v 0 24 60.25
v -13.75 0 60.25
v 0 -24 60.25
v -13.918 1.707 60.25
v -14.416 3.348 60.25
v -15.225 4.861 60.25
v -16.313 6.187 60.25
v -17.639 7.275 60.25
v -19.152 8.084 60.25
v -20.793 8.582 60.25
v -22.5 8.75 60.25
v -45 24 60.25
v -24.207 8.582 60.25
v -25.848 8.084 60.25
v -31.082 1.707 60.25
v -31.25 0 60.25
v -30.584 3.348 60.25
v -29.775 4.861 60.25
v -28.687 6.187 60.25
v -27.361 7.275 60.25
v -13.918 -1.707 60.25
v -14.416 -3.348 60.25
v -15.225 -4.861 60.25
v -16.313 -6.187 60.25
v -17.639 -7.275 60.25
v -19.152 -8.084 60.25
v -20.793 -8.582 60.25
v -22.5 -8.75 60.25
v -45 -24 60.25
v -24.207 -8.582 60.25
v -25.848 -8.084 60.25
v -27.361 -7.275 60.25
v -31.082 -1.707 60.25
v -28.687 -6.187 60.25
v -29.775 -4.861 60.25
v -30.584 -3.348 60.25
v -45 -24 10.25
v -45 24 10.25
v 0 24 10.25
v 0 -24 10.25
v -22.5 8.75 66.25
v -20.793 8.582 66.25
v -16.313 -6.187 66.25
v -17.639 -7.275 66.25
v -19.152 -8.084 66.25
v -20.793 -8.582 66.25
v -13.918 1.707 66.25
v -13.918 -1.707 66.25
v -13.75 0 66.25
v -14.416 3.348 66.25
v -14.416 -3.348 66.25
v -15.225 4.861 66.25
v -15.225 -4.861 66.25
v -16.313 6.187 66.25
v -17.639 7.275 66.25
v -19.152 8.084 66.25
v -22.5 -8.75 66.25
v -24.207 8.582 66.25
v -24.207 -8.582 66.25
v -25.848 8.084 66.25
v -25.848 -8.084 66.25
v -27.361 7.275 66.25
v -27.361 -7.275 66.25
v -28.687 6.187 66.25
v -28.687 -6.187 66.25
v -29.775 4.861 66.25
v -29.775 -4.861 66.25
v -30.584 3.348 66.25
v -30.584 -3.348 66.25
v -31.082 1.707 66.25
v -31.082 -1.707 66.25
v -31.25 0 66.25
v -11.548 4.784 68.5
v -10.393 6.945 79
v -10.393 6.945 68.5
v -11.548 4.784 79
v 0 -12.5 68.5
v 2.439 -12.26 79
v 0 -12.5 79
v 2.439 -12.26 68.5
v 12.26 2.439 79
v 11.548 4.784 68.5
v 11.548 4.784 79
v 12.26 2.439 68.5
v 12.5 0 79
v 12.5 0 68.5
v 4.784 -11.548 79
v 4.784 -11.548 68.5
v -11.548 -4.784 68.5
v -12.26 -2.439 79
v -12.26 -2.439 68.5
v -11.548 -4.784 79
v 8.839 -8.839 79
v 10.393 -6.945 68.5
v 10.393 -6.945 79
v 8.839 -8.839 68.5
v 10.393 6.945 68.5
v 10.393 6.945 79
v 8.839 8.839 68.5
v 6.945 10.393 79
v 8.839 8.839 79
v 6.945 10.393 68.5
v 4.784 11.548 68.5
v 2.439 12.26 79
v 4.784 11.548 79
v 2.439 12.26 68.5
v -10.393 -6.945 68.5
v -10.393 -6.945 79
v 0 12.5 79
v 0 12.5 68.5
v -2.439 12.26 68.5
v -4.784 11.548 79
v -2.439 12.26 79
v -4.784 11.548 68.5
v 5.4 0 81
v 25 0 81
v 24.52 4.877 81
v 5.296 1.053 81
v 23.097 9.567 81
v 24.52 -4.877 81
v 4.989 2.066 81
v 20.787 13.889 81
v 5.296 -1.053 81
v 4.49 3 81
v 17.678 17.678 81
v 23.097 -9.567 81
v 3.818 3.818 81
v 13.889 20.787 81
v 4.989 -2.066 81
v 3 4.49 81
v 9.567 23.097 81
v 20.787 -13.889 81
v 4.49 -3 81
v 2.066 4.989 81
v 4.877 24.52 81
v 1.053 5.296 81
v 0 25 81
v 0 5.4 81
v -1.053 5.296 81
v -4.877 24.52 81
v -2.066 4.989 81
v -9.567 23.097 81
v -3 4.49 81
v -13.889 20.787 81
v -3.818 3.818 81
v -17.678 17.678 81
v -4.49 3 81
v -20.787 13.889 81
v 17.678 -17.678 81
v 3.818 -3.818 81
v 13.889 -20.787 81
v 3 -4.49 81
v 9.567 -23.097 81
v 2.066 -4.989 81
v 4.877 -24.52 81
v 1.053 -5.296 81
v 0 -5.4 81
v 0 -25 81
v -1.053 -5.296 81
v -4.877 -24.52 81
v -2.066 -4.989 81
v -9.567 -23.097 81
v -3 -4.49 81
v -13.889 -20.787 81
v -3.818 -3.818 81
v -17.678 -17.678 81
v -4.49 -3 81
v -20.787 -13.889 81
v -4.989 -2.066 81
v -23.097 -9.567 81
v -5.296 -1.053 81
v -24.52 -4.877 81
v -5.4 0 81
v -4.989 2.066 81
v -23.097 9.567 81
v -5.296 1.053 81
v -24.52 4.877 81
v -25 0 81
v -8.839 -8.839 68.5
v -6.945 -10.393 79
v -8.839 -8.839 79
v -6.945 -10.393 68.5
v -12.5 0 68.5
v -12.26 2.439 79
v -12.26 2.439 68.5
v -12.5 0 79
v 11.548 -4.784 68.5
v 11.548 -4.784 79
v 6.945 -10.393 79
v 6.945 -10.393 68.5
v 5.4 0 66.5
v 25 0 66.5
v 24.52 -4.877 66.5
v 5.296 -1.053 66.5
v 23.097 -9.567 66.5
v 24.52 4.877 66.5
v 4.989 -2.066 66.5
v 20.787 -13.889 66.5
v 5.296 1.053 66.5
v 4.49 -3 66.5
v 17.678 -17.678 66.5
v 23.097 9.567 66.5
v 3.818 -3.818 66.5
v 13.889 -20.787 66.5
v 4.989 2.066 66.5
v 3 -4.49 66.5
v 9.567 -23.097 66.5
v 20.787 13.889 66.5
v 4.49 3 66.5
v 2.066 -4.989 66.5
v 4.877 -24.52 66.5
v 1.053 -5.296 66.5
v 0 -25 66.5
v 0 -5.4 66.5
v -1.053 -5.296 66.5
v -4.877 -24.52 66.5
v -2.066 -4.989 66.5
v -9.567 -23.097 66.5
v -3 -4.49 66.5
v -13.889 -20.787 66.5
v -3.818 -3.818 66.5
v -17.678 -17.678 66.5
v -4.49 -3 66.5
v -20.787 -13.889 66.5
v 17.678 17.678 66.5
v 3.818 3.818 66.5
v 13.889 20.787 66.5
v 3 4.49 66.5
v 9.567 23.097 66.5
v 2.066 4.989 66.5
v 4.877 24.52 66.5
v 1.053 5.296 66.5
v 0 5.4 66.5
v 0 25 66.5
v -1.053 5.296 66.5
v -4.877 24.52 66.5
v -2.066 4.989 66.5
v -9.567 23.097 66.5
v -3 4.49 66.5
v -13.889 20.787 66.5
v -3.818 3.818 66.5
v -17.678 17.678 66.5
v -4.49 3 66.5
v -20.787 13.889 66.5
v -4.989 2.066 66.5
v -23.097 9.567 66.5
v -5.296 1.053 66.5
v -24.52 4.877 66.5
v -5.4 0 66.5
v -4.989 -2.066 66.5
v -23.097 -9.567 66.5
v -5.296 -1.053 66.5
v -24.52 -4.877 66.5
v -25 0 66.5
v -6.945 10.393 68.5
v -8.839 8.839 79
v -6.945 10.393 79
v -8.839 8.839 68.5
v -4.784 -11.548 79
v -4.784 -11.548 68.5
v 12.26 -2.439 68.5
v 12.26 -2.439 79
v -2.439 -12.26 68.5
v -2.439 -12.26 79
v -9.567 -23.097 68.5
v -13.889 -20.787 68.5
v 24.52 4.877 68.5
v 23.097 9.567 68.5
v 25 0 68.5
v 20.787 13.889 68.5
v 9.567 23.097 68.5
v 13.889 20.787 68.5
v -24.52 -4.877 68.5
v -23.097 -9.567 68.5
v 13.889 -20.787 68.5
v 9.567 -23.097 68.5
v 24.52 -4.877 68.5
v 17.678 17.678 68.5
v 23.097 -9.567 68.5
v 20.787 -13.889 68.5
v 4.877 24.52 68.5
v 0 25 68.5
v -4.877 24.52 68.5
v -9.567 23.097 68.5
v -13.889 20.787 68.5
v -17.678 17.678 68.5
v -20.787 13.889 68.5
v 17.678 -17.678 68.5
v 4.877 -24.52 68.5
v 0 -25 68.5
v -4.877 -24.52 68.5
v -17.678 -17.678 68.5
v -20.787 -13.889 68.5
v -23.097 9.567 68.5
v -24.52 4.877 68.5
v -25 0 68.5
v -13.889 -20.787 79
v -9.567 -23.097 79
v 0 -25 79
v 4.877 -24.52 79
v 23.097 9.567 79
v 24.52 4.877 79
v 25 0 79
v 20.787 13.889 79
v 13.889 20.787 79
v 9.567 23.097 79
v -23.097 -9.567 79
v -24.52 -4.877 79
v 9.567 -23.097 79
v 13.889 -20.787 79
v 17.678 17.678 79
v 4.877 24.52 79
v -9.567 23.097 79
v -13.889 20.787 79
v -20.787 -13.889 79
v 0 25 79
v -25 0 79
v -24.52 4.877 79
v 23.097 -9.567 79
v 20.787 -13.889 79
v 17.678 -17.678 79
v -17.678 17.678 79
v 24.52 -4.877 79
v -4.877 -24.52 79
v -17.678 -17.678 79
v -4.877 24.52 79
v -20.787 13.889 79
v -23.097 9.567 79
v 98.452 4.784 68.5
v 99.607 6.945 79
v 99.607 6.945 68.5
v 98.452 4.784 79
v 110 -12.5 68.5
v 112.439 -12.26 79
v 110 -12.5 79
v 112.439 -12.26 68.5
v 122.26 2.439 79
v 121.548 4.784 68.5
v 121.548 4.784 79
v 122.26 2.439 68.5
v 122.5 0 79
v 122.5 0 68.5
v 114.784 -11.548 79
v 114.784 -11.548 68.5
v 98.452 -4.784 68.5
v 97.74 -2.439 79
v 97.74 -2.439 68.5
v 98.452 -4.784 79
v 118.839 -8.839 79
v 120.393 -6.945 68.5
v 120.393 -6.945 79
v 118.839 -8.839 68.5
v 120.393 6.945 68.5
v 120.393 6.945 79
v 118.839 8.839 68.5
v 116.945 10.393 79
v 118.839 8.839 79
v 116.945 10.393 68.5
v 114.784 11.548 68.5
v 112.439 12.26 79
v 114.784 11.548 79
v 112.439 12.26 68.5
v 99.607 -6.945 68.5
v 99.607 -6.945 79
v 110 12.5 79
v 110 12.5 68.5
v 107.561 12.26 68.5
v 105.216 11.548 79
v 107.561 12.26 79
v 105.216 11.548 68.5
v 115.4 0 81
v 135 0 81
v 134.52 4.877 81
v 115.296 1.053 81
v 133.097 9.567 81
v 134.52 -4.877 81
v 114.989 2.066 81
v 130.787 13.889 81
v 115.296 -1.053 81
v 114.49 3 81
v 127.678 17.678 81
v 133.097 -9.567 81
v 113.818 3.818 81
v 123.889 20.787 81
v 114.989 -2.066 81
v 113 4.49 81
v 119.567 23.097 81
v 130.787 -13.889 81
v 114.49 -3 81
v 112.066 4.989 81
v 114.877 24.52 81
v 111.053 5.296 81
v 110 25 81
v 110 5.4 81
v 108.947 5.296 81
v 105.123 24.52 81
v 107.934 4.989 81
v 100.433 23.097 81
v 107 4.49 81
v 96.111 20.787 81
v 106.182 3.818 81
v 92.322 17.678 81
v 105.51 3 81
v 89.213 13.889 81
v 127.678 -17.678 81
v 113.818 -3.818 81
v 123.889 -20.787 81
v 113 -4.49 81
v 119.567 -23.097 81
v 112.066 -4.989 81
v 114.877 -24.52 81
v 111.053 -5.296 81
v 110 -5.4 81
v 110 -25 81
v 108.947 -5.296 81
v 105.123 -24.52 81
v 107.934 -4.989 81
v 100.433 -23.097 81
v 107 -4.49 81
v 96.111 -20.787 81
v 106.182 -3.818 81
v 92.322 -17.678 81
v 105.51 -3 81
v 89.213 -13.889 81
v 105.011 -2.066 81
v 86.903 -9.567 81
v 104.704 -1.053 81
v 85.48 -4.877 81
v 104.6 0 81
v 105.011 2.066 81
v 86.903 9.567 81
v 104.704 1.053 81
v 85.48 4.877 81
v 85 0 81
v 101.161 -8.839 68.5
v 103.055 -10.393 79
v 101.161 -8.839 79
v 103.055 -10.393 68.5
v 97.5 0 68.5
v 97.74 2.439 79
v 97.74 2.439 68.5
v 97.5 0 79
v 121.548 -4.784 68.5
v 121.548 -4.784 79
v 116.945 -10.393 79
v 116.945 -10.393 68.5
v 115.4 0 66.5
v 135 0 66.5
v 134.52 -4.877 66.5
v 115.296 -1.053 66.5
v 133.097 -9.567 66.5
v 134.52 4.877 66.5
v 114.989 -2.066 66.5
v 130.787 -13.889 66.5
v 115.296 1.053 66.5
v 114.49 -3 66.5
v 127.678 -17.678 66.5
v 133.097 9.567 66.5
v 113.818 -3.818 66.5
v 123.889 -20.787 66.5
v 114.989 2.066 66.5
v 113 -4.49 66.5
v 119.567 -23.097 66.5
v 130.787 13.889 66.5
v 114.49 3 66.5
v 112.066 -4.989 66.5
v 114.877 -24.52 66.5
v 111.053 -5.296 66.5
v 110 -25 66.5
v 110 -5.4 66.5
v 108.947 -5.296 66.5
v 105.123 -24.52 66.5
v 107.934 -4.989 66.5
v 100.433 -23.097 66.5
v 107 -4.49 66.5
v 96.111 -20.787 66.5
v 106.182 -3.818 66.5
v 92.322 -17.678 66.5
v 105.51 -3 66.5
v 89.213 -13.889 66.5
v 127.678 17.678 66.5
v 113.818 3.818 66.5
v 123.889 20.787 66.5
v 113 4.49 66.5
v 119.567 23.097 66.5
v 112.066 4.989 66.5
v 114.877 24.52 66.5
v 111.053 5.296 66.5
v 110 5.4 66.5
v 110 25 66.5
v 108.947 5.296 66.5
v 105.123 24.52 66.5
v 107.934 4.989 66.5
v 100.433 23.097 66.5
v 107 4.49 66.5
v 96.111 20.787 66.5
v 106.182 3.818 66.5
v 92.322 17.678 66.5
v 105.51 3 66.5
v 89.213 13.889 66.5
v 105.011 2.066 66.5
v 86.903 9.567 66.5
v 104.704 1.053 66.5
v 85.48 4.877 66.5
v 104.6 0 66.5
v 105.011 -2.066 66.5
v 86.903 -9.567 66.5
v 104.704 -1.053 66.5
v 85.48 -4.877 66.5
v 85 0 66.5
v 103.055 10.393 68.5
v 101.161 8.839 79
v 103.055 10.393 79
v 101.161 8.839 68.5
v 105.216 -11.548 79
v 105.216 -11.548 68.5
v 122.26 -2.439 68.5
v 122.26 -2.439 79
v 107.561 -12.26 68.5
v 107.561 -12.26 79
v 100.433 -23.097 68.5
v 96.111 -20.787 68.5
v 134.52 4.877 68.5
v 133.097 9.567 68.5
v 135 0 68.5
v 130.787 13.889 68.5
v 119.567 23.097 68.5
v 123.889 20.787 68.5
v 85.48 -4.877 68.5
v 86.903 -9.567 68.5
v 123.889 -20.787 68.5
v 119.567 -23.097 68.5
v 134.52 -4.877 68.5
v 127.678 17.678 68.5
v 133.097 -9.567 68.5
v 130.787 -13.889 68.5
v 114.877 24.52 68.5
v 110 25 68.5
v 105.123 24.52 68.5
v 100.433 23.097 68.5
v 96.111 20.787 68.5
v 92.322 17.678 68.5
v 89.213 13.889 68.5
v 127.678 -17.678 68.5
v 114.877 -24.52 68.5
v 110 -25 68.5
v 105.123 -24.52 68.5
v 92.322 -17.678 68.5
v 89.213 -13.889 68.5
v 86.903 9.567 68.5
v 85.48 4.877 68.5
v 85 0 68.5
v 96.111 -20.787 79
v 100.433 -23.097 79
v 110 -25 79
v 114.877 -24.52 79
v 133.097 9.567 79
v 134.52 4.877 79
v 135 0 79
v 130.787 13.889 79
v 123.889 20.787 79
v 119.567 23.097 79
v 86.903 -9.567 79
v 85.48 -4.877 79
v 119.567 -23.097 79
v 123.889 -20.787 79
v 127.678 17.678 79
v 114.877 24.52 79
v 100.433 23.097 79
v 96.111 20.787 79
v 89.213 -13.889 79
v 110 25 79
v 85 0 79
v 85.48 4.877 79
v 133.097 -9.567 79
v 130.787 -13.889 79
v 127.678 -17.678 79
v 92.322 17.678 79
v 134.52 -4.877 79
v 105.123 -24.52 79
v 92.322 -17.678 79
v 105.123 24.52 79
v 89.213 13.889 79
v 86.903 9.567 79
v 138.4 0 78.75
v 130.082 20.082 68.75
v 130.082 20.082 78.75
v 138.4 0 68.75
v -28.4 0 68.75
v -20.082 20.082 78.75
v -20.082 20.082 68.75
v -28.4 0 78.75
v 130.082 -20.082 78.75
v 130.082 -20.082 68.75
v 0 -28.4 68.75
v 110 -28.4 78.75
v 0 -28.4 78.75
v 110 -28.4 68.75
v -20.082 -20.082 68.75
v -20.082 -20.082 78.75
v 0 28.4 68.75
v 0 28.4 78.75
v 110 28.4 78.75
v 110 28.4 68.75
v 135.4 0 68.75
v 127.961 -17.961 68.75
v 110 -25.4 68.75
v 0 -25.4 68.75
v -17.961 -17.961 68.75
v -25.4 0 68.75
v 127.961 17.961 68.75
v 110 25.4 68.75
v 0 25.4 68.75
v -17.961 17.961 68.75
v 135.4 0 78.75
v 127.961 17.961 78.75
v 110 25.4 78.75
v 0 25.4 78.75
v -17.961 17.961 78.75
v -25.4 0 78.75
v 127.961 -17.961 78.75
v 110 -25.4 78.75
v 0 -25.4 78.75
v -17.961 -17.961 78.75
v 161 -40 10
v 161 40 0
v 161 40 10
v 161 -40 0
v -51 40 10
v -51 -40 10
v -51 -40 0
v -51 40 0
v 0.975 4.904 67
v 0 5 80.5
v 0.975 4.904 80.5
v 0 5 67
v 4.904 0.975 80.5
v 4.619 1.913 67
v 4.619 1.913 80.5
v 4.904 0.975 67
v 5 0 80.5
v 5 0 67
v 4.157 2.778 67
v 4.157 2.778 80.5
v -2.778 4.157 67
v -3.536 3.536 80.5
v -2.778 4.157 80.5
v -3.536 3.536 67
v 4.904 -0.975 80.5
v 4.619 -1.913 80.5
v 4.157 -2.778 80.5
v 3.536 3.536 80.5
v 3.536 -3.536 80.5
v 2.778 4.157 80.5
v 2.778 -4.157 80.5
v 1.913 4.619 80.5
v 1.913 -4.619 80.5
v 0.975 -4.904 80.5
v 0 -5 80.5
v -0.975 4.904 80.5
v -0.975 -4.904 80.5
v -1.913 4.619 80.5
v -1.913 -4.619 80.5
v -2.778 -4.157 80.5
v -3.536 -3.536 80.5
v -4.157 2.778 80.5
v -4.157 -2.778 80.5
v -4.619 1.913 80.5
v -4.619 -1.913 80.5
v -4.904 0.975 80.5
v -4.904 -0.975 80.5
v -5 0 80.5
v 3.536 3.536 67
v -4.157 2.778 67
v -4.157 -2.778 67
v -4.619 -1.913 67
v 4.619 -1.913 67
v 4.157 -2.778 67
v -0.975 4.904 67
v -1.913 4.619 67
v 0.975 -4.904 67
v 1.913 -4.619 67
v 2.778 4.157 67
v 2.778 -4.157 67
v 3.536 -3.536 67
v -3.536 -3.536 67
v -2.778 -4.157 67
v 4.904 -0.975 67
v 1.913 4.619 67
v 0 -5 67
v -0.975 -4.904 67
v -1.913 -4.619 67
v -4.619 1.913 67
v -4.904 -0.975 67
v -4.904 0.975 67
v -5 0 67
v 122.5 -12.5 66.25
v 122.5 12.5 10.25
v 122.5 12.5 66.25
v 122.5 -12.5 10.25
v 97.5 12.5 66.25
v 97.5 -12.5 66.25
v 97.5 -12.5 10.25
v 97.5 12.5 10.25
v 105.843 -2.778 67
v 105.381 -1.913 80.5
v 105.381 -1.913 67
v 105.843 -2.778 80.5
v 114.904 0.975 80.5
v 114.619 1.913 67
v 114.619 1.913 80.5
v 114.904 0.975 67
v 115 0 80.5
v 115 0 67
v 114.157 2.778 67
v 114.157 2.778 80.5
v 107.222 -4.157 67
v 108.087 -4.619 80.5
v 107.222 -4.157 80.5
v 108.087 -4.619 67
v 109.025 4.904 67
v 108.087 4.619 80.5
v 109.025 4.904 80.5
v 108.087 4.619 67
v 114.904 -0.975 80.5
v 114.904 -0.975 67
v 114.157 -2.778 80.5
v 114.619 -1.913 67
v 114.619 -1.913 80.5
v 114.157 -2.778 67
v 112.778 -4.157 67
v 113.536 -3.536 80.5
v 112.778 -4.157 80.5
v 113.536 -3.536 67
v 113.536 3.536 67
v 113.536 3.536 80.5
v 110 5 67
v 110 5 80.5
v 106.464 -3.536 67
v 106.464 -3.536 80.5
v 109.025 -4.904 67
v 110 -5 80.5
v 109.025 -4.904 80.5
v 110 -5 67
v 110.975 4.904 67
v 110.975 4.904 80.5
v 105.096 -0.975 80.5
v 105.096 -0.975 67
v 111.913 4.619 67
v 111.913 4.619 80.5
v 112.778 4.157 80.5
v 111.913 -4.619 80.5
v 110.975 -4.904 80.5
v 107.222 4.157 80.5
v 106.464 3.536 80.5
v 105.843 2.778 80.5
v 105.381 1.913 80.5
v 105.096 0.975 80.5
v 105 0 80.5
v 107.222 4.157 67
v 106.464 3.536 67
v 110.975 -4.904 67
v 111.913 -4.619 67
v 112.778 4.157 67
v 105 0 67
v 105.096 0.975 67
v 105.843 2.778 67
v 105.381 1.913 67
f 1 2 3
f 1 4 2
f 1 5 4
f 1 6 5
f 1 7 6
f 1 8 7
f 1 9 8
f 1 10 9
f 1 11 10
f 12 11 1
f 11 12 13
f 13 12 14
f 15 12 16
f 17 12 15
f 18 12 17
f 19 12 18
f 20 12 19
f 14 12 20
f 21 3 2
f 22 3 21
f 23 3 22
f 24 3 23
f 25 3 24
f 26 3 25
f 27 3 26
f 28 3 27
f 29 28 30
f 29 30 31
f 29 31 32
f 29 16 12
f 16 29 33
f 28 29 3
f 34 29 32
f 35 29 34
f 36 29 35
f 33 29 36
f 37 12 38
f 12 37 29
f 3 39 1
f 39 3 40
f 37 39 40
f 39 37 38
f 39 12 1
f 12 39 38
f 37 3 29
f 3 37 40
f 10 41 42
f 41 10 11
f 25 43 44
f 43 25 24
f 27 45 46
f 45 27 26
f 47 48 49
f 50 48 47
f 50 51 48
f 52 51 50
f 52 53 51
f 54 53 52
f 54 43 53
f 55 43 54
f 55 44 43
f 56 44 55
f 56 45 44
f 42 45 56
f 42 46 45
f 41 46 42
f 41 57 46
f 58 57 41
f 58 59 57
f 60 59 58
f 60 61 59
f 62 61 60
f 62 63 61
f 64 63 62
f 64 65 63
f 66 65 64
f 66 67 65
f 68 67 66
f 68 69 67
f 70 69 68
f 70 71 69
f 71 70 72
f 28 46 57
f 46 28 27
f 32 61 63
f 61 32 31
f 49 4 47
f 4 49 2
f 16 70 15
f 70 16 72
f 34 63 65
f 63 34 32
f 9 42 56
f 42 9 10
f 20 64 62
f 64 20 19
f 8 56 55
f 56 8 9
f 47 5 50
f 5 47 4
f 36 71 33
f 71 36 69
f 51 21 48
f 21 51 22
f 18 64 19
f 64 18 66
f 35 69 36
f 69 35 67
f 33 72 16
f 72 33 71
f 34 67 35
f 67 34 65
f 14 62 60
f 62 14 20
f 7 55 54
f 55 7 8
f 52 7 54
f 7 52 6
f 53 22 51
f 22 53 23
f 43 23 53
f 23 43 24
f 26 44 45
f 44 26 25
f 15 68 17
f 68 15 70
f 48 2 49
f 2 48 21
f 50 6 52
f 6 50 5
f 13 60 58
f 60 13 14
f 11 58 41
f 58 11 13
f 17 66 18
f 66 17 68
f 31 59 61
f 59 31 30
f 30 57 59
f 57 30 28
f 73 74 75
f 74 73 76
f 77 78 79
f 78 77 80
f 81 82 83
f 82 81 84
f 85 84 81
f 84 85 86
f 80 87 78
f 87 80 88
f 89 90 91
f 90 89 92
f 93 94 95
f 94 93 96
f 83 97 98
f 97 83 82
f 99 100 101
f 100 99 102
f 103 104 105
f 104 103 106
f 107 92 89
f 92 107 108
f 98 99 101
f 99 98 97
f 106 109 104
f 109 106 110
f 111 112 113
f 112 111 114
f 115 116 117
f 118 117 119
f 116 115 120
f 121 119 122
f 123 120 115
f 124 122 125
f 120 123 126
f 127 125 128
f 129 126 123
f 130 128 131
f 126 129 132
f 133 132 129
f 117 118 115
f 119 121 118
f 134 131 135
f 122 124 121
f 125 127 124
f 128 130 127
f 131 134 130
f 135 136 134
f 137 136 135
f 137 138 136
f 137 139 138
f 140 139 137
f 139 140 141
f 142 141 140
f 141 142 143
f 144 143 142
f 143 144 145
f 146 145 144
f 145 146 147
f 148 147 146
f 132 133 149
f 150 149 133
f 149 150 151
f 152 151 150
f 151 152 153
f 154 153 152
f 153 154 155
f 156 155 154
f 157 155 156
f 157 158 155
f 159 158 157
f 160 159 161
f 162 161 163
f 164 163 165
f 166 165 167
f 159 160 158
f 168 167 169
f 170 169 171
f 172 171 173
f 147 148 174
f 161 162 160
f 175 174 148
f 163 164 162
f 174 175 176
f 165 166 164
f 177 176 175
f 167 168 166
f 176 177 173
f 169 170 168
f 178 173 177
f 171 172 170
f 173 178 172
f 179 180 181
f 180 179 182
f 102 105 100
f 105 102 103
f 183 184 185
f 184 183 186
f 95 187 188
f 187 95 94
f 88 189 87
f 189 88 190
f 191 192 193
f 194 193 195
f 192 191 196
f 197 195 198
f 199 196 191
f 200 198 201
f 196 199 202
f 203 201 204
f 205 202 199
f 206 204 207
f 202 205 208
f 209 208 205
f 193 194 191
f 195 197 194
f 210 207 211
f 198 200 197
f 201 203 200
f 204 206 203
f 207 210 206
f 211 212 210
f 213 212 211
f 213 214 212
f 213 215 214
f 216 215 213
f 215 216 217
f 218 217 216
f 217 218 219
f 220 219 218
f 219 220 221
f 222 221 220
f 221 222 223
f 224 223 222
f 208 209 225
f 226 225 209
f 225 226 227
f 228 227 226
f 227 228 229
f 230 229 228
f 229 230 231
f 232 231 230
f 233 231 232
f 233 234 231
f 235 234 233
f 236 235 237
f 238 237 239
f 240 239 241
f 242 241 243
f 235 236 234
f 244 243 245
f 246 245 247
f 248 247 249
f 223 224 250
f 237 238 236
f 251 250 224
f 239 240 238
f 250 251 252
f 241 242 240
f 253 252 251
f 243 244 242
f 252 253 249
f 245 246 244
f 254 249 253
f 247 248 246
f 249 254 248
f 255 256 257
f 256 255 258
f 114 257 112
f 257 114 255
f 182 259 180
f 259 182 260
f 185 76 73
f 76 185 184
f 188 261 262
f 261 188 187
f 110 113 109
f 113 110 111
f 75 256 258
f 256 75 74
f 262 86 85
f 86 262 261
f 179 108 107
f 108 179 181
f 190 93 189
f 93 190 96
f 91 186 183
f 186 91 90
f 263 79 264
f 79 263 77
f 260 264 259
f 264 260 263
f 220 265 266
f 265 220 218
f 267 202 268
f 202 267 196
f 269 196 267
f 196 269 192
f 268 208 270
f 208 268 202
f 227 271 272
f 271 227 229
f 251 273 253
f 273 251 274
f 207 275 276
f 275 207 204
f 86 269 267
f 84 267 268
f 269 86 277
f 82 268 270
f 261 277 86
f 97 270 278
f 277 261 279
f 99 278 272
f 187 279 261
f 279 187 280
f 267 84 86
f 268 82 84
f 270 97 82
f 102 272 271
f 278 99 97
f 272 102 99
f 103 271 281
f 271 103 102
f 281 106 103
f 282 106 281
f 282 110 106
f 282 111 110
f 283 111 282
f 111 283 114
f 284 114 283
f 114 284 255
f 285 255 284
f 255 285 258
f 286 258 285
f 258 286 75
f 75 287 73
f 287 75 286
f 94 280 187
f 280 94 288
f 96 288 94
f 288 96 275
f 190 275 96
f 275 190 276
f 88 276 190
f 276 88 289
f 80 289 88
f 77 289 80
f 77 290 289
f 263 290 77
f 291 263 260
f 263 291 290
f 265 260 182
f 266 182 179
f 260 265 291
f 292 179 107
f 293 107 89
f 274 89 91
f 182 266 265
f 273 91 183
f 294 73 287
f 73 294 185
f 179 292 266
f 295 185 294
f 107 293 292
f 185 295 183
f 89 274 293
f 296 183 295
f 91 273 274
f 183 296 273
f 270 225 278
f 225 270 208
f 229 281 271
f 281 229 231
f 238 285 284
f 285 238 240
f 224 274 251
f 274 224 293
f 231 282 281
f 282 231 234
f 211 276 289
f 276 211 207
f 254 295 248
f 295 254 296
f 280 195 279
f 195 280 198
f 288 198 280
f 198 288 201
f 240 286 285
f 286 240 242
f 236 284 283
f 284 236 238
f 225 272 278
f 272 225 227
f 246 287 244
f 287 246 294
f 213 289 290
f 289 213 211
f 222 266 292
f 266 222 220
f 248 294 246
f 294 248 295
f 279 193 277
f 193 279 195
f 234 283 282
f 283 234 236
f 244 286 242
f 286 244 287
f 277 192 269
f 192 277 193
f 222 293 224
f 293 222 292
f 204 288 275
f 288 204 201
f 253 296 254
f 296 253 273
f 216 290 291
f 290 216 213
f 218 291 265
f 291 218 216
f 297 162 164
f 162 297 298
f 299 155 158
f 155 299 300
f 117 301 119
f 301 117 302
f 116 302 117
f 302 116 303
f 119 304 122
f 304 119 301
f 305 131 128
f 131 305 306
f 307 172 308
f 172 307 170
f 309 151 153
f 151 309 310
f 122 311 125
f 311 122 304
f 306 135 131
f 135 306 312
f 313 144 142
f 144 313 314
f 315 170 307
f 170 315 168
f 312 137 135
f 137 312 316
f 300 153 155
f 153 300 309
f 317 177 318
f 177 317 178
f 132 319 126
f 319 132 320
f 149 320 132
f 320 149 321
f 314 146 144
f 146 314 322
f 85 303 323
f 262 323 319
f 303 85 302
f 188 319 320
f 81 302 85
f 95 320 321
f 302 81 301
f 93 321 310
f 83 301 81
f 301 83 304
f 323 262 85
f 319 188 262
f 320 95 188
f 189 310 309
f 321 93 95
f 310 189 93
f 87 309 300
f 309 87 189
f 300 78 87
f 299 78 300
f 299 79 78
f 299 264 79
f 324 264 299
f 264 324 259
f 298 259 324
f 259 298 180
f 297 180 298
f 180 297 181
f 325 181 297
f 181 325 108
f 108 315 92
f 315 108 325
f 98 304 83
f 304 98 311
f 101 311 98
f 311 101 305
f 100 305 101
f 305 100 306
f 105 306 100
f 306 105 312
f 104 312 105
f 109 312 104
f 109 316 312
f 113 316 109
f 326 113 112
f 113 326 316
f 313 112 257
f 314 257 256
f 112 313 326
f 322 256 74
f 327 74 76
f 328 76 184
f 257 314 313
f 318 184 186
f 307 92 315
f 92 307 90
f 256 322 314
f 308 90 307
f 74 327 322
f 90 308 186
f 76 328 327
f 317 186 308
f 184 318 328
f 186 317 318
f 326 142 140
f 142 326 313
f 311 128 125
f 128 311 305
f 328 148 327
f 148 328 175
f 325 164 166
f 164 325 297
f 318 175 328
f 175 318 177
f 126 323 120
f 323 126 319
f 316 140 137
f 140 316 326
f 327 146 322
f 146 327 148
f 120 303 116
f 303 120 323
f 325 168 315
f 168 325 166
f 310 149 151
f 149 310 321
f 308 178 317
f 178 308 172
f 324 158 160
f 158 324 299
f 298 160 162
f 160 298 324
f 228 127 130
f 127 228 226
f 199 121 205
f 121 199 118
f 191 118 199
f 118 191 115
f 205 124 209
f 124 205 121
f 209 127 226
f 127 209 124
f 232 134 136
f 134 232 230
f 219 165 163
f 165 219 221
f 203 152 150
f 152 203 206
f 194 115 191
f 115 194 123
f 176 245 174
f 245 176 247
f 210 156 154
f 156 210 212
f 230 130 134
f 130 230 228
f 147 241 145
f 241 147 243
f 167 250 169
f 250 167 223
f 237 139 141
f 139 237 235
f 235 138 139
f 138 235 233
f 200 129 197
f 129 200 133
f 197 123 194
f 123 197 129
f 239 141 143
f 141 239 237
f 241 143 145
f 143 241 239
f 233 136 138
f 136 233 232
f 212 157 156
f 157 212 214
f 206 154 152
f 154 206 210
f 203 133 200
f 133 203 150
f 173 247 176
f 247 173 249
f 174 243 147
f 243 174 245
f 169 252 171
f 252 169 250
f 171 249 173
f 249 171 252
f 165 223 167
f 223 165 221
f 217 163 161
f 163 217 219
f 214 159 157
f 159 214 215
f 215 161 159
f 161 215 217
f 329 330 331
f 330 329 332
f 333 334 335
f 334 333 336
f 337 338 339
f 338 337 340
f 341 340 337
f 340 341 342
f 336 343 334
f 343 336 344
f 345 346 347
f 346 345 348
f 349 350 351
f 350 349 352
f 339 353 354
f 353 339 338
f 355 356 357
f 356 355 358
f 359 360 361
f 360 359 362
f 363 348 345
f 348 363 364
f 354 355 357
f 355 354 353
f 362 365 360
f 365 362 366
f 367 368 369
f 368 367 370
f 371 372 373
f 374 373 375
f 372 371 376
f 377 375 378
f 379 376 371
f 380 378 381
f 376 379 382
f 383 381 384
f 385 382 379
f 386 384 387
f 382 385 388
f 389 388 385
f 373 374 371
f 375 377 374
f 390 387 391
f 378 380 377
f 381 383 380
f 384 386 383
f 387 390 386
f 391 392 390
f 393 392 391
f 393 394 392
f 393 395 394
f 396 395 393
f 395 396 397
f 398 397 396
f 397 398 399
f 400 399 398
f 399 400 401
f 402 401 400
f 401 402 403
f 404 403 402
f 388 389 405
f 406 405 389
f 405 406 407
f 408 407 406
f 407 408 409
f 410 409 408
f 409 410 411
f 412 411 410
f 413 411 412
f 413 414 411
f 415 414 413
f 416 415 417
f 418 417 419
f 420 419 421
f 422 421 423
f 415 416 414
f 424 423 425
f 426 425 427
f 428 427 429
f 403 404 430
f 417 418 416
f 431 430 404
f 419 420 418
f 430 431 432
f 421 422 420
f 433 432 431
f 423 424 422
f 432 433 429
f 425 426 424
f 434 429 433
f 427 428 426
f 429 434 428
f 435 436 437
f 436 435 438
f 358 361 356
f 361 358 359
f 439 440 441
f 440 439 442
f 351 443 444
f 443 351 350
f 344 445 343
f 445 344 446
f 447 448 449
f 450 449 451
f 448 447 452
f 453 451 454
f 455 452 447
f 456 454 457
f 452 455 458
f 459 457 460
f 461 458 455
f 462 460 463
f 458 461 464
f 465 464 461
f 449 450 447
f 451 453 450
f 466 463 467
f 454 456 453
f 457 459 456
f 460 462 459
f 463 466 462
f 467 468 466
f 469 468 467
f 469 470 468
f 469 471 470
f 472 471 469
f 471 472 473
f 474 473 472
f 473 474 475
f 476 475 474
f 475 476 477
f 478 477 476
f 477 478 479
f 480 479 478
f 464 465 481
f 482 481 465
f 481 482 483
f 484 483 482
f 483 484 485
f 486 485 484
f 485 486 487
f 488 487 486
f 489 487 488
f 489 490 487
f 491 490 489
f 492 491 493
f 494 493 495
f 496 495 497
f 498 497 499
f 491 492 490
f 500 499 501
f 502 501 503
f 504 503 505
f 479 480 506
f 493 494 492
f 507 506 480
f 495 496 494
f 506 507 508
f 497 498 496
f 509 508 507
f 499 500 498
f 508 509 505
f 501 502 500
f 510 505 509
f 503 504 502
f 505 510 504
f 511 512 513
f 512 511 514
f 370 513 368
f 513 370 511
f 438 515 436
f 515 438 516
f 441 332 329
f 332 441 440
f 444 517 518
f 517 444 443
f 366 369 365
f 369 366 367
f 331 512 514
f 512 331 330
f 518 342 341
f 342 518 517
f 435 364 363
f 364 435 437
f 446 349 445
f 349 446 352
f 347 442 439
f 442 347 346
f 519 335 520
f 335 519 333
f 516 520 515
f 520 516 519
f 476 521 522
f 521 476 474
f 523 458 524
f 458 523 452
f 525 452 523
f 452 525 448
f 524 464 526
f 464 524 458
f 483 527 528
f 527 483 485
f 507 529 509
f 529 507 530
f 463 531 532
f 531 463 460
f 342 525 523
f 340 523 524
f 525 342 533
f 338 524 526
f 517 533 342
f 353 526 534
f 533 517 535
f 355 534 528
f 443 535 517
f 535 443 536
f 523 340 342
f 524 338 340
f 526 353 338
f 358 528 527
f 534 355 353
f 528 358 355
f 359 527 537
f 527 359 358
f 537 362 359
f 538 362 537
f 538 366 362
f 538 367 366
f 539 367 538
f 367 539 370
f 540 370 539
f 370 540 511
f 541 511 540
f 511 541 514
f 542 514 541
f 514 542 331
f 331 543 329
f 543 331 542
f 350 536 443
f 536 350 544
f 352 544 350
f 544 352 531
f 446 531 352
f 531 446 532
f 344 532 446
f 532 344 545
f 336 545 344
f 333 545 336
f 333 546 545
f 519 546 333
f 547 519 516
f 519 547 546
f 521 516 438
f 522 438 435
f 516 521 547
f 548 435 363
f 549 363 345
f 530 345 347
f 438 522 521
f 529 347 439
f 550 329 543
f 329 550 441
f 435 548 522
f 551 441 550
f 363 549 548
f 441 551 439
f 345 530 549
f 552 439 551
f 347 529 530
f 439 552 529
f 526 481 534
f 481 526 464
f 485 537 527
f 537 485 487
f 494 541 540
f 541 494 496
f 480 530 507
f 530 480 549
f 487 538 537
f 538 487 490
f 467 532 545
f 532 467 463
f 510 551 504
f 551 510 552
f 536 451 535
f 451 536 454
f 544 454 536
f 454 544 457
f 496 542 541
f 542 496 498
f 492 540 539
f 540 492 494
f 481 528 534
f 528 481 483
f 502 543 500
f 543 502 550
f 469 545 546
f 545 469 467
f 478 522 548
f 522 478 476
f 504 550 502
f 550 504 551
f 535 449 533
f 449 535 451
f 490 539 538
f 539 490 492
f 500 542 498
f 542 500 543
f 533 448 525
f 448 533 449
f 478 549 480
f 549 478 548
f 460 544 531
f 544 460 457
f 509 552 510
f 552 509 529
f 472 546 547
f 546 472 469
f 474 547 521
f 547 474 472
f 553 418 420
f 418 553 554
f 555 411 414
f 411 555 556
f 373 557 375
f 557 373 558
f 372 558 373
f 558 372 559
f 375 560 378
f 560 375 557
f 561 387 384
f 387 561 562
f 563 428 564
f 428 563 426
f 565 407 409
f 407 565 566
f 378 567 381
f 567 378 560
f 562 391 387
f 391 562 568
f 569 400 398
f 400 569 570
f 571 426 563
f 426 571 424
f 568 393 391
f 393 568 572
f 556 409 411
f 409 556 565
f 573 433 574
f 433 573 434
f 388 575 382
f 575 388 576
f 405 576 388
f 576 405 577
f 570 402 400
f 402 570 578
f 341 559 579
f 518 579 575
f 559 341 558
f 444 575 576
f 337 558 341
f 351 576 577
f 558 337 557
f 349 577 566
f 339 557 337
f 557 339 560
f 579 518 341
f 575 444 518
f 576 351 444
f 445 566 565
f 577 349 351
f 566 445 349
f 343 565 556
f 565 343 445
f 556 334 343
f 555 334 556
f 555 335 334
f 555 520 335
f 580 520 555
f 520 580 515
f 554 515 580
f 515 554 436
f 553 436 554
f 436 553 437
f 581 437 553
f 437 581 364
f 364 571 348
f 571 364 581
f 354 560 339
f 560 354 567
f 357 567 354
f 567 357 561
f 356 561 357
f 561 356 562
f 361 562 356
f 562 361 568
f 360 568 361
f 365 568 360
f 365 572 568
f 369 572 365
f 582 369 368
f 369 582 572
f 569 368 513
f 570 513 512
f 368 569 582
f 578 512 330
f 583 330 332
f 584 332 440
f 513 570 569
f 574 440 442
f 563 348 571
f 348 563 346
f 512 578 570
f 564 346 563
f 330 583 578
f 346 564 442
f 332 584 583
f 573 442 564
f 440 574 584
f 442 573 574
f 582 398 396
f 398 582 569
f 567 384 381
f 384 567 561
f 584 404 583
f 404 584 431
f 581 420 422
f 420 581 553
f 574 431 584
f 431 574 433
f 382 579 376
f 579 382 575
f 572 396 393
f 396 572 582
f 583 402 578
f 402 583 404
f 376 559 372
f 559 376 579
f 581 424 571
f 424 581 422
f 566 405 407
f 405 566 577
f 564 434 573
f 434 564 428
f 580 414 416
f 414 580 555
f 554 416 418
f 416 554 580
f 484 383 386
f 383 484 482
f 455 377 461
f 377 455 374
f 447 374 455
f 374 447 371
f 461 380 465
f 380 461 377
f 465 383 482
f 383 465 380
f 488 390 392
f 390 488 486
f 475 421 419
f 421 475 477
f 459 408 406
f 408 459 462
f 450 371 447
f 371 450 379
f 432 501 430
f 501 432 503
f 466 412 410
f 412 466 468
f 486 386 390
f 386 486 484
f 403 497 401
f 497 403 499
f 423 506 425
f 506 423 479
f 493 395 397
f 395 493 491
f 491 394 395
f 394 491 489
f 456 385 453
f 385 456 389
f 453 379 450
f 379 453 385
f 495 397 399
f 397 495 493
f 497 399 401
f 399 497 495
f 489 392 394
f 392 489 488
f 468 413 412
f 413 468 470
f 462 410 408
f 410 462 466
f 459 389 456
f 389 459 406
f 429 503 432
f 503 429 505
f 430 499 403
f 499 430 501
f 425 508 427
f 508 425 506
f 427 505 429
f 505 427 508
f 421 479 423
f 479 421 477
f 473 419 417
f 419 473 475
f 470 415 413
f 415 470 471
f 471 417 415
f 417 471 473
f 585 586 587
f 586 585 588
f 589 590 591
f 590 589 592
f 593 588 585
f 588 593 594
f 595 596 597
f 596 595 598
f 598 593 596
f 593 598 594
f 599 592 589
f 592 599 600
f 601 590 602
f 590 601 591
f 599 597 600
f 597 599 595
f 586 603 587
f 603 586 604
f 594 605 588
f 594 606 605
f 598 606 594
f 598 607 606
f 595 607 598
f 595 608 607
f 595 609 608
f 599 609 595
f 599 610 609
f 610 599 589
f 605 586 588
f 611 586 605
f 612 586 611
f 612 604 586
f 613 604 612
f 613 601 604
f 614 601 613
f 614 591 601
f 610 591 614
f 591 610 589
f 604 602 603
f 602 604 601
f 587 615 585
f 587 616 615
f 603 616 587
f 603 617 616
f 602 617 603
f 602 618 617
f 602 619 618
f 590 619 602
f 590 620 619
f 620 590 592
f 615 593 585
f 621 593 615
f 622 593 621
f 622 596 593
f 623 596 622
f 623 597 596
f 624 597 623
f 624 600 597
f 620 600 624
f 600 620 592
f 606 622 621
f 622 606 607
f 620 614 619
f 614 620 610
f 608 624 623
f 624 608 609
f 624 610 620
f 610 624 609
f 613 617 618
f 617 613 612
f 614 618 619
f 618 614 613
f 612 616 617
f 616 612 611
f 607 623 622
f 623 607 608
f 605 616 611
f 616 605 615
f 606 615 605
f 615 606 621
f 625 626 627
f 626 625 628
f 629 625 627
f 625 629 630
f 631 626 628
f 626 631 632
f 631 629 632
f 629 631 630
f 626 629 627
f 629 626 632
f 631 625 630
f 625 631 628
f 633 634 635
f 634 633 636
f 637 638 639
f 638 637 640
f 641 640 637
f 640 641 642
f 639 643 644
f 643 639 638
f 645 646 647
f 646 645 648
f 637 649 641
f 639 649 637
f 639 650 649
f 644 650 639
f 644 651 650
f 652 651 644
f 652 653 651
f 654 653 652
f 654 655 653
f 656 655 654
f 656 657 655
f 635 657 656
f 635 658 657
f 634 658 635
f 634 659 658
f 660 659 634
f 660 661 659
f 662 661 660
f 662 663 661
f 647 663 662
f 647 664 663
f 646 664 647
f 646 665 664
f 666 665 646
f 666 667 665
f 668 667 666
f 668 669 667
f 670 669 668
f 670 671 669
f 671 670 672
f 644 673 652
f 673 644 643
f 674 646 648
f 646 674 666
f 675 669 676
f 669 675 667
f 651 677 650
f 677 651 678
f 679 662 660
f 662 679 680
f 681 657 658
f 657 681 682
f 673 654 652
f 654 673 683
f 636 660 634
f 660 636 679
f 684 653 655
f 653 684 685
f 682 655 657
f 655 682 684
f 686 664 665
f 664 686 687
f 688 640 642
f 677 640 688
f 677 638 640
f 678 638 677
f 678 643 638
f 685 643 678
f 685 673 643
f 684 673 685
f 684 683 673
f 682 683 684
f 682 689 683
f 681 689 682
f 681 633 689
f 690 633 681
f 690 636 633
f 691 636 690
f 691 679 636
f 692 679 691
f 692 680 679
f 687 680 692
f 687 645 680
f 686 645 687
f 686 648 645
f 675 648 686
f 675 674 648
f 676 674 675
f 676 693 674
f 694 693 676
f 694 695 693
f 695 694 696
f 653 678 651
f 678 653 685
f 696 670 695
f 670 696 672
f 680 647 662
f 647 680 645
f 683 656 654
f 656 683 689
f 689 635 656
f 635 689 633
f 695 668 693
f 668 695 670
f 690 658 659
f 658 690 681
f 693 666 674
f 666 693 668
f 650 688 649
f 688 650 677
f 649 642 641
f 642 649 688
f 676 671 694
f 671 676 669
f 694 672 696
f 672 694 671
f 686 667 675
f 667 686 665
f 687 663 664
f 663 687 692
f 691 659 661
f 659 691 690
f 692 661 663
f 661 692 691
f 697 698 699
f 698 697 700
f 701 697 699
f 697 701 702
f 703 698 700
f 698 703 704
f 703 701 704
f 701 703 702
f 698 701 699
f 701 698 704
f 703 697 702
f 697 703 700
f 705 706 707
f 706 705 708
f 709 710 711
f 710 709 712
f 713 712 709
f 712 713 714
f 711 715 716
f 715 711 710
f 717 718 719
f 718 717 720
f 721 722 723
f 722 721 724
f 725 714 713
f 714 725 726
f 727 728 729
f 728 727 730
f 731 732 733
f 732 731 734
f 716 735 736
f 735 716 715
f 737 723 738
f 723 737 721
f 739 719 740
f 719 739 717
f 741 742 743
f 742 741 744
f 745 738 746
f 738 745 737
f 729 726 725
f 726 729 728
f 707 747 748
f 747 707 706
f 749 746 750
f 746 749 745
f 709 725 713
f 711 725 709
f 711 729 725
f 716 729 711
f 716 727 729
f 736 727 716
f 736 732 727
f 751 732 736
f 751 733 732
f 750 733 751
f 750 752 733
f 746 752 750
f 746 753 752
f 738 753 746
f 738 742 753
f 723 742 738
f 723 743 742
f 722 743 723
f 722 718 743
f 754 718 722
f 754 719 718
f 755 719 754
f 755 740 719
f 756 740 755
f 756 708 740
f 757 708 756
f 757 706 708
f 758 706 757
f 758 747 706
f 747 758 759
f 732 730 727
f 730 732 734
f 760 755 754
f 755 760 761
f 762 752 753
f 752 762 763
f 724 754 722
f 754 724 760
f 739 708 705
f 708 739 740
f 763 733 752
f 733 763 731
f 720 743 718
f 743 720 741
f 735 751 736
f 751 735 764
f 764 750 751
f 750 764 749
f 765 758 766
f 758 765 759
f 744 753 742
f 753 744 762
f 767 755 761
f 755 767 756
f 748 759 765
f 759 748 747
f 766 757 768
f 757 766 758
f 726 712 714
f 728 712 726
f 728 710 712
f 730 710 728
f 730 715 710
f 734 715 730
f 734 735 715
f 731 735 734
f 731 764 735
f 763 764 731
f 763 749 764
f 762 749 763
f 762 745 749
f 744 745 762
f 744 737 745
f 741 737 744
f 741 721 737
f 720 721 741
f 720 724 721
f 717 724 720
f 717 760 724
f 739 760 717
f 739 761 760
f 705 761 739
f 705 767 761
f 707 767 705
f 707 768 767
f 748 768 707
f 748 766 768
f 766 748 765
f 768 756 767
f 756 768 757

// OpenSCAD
$fn = 32;

// ------------------------------------------------------------------------
// Motor belt drive: span 110 mm, pulleys d50, belt 10 mm wide
// Every part is its own module, assembly() places every instance.
// ------------------------------------------------------------------------

// --- part 1 ---
module base_plate() {
  difference() {
    translate([-106, -40, 0]) cube([212, 80, 10]);
  }
}

// --- part 2 ---
module motor() {
  union() {
    translate([-25, -24, 0]) cube([50, 48, 45]);
    translate([28, 0, 22.5]) rotate([0, 90, 0]) cylinder(h = 6, d = 17.5, center = true);
  }
}

// --- part 3 ---
module drive_shaft() {
  translate([0, 0, -6.75]) cylinder(h = 13.5, d = 10);
}

// --- part 4 ---
module pulley_drive() {
  difference() {
    union() {
      cylinder(h = 14.5, d = 25);
      cylinder(h = 2, d = 50);
      translate([0, 0, 12.5]) cylinder(h = 2, d = 50);
    }
    translate([0, 0, -1]) cylinder(h = 16.5, d = 10.8);
  }
}

// --- part 5 ---
module idler_post() {
  translate([-12.5, -12.5, 0]) cube([25, 25, 56]);
}

// --- part 6 ---
module driven_shaft() {
  translate([0, 0, -6.75]) cylinder(h = 13.5, d = 10);
}

// --- part 7 ---
module pulley_driven() {
  difference() {
    union() {
      cylinder(h = 14.5, d = 25);
      cylinder(h = 2, d = 50);
      translate([0, 0, 12.5]) cylinder(h = 2, d = 50);
    }
    translate([0, 0, -1]) cylinder(h = 16.5, d = 10.8);
  }
}

// --- part 8 ---
module drive_belt() {
  difference() {
    linear_extrude(height = 10) polygon(points = concat([for (a = [90 : 45 : 270]) [28.4 * cos(a), 28.4 * sin(a)]], [for (a = [270 : 45 : 450]) [110 + 28.4 * cos(a), 28.4 * sin(a)]]));
    translate([0, 0, -1]) linear_extrude(height = 12) polygon(points = concat([for (a = [90 : 45 : 270]) [25.4 * cos(a), 25.4 * sin(a)]], [for (a = [270 : 45 : 450]) [110 + 25.4 * cos(a), 25.4 * sin(a)]]));
  }
}

// --- assembly ---
module assembly() {
  color([0.80, 0.24, 0.20]) translate([55, 0, 0]) rotate([0, 0, 0]) base_plate();
  color([0.20, 0.45, 0.75]) translate([0, 0, 35.25]) rotate([0, 270, 0]) motor();
  color([0.25, 0.62, 0.32]) translate([0, 0, 73.75]) rotate([0, 0, 0]) drive_shaft();
  color([0.92, 0.70, 0.18]) translate([0, 0, 66.5]) rotate([0, 0, 0]) pulley_drive();
  color([0.58, 0.35, 0.70]) translate([110, 0, 10.25]) rotate([0, 0, 0]) idler_post();
  color([0.16, 0.66, 0.66]) translate([110, 0, 73.75]) rotate([0, 0, 0]) driven_shaft();
  color([0.85, 0.48, 0.18]) translate([110, 0, 66.5]) rotate([0, 0, 0]) pulley_driven();
  color([0.55, 0.60, 0.65]) translate([0, 0, 68.75]) rotate([0, 0, 0]) drive_belt();
}

assembly();
